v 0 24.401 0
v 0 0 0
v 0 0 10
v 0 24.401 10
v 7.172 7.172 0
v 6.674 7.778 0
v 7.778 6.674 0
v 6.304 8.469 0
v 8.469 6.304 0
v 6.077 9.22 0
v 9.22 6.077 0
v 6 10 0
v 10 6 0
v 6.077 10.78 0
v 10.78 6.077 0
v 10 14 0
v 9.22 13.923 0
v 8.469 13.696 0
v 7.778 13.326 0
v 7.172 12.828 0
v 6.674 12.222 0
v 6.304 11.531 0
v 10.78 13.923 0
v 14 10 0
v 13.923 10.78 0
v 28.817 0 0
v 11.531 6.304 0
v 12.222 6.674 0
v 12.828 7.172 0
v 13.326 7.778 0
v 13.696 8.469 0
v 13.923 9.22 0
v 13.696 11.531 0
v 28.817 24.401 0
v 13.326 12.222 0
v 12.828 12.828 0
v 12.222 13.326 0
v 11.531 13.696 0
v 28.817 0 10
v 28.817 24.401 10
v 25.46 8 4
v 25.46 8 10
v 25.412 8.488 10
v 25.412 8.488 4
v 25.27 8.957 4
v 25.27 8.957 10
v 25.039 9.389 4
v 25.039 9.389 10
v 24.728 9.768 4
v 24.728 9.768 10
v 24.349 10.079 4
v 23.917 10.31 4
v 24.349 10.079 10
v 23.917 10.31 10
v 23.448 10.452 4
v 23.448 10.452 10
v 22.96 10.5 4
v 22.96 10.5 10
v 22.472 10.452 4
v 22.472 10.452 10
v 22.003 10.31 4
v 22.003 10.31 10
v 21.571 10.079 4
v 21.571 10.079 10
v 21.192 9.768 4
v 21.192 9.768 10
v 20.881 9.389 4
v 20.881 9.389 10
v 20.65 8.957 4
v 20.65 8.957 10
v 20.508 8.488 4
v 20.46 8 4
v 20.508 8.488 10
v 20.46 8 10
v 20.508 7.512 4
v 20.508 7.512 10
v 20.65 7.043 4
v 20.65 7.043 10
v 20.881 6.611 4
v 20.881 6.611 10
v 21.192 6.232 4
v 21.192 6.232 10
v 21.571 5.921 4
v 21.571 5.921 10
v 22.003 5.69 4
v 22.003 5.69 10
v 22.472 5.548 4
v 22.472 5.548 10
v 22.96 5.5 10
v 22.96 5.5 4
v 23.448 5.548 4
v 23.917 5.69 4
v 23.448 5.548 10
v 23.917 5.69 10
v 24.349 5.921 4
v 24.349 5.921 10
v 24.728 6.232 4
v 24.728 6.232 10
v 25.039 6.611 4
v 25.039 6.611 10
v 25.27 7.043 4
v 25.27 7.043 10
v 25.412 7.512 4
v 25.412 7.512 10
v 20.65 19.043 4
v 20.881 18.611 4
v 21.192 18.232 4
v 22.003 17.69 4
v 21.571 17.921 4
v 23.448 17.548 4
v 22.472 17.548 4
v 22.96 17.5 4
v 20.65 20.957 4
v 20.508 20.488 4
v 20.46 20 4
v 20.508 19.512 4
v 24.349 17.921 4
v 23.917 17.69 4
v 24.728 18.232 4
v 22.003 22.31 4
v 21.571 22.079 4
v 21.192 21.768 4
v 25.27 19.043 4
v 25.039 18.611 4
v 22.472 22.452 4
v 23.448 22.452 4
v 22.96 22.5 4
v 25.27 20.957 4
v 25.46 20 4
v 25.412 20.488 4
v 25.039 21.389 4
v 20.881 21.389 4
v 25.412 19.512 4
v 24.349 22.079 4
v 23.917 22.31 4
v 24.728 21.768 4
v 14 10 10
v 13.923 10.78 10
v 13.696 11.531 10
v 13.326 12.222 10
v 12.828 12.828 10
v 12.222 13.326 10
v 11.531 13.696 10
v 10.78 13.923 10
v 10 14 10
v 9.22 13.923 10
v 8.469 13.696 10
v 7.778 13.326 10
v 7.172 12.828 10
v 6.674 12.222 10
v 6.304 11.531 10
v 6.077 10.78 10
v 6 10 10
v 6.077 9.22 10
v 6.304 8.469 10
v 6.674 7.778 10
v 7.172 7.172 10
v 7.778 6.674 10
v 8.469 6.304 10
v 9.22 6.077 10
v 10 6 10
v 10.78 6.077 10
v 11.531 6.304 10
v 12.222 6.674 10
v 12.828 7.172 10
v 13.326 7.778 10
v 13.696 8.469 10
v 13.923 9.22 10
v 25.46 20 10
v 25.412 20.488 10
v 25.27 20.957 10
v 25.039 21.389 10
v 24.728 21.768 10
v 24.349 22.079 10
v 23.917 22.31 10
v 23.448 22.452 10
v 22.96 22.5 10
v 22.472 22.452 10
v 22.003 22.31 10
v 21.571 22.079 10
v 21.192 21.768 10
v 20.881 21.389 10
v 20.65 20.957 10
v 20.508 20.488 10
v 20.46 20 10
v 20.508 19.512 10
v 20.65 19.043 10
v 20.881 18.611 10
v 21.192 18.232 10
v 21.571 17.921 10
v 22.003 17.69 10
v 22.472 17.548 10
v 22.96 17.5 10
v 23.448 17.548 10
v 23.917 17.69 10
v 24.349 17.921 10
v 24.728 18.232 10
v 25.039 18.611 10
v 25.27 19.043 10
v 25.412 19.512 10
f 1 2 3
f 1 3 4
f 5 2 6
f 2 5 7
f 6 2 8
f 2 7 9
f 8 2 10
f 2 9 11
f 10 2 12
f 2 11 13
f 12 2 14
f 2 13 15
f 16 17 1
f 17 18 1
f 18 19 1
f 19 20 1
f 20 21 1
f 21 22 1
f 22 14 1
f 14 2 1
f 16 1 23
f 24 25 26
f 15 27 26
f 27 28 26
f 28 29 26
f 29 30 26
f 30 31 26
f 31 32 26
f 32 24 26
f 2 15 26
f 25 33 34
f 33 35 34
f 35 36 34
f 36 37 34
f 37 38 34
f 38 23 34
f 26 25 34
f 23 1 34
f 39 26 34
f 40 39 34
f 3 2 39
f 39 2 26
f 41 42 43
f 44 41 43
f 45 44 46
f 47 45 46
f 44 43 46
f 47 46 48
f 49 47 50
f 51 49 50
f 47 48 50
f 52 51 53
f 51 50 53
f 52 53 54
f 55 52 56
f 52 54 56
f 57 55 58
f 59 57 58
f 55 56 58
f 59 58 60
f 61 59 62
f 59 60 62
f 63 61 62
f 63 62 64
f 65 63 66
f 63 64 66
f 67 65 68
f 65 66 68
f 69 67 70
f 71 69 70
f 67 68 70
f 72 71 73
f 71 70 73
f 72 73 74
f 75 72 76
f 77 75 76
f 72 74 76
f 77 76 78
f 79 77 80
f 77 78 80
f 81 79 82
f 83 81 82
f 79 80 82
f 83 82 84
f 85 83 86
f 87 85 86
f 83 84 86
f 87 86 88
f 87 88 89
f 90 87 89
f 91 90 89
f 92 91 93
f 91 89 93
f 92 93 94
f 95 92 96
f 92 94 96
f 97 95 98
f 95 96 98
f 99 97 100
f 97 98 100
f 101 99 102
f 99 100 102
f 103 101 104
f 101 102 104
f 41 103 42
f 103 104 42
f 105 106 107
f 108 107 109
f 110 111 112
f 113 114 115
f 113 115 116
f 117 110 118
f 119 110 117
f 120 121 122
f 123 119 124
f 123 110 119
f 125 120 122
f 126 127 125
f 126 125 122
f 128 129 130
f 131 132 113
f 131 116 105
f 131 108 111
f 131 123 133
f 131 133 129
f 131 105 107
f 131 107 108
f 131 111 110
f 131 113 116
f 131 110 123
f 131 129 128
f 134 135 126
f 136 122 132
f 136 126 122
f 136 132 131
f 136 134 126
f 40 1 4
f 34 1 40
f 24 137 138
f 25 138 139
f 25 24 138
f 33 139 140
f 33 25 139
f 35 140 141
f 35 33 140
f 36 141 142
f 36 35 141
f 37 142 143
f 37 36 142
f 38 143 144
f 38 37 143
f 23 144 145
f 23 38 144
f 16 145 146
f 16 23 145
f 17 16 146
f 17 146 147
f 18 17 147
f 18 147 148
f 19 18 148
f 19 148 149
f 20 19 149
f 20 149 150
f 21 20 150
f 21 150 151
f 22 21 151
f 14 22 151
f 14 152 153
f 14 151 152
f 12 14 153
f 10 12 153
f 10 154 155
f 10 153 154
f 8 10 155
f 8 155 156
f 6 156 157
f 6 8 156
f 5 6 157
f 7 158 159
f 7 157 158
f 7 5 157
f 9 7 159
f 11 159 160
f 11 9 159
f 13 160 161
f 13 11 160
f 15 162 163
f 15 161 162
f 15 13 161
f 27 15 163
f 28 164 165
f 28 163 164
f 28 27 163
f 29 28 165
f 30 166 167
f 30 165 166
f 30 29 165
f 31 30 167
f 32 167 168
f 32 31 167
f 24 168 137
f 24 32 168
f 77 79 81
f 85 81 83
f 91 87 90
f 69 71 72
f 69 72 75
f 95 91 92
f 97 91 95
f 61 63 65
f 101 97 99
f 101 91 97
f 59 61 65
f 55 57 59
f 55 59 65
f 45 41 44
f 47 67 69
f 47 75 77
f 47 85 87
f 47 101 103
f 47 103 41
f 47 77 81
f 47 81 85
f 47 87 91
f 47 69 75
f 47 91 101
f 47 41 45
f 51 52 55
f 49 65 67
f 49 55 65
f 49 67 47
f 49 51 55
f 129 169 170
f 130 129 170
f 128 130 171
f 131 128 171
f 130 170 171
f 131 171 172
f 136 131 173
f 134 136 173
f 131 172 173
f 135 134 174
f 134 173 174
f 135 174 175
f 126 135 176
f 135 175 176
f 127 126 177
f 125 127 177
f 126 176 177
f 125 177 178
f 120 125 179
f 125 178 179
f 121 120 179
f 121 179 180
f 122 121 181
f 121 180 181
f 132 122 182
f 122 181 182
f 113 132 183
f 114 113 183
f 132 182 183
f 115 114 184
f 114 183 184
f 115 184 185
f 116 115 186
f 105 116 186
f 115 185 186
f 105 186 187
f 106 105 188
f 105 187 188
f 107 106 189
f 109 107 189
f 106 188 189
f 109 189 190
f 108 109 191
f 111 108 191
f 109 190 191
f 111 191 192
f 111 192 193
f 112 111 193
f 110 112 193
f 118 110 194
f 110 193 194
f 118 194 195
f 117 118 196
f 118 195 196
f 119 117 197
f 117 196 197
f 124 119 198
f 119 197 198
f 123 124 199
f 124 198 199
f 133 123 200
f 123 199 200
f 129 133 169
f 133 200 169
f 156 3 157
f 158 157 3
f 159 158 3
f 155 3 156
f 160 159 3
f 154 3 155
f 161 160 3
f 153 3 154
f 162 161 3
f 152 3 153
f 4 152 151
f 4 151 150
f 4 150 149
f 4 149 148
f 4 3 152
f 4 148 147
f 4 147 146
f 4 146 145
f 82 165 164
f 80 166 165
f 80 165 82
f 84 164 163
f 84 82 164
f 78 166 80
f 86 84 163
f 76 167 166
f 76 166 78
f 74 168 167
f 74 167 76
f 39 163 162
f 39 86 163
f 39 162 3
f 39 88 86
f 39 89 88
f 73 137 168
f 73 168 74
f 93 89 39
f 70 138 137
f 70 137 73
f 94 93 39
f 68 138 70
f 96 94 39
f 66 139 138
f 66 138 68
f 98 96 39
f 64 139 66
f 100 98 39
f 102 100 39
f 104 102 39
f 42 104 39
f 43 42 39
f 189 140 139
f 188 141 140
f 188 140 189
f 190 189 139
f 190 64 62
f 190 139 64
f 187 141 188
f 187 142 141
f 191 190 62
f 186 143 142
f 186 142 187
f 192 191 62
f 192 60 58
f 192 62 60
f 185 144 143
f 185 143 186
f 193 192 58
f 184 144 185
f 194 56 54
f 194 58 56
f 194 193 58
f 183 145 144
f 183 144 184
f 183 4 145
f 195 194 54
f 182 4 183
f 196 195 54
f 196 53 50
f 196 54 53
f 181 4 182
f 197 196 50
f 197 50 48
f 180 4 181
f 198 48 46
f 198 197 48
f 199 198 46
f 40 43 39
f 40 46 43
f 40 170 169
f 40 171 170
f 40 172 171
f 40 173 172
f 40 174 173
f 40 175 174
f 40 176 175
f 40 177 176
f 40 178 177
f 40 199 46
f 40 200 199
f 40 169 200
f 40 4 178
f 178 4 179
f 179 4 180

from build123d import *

# Parameters (mm, degrees)
SKETCH_W        = 28.817356
SKETCH_H        = 24.401199
PAD_DEPTH       = 10
SKETCH001_R     = 4
POCKET_DEPTH    = 10.001
SKETCH002_R     = 2.5
POCKET001_DEPTH = 6


with BuildPart() as part:
    # Sketch → Pad (new body)
    with BuildSketch(Plane.XY):
        with Locations((14.408678, 12.200599)):
            Rectangle(SKETCH_W, SKETCH_H)
    extrude(amount=PAD_DEPTH)

    # Sketch001 → Pocket (cut, through all)
    with BuildSketch(Plane.XY):
        with Locations((10, 10)):
            Circle(SKETCH001_R)
    extrude(amount=POCKET_DEPTH, mode=Mode.SUBTRACT)

    # Sketch002 (on Face5 of Pocket) → Pocket001 (cut)
    with BuildSketch(Plane.XY.offset(10)):
        with Locations((22.960093, 8)):
            Circle(SKETCH002_R)
        with Locations((22.960093, 20)):
            Circle(SKETCH002_R)
    extrude(amount=-POCKET001_DEPTH, mode=Mode.SUBTRACT)


solid = part.part
